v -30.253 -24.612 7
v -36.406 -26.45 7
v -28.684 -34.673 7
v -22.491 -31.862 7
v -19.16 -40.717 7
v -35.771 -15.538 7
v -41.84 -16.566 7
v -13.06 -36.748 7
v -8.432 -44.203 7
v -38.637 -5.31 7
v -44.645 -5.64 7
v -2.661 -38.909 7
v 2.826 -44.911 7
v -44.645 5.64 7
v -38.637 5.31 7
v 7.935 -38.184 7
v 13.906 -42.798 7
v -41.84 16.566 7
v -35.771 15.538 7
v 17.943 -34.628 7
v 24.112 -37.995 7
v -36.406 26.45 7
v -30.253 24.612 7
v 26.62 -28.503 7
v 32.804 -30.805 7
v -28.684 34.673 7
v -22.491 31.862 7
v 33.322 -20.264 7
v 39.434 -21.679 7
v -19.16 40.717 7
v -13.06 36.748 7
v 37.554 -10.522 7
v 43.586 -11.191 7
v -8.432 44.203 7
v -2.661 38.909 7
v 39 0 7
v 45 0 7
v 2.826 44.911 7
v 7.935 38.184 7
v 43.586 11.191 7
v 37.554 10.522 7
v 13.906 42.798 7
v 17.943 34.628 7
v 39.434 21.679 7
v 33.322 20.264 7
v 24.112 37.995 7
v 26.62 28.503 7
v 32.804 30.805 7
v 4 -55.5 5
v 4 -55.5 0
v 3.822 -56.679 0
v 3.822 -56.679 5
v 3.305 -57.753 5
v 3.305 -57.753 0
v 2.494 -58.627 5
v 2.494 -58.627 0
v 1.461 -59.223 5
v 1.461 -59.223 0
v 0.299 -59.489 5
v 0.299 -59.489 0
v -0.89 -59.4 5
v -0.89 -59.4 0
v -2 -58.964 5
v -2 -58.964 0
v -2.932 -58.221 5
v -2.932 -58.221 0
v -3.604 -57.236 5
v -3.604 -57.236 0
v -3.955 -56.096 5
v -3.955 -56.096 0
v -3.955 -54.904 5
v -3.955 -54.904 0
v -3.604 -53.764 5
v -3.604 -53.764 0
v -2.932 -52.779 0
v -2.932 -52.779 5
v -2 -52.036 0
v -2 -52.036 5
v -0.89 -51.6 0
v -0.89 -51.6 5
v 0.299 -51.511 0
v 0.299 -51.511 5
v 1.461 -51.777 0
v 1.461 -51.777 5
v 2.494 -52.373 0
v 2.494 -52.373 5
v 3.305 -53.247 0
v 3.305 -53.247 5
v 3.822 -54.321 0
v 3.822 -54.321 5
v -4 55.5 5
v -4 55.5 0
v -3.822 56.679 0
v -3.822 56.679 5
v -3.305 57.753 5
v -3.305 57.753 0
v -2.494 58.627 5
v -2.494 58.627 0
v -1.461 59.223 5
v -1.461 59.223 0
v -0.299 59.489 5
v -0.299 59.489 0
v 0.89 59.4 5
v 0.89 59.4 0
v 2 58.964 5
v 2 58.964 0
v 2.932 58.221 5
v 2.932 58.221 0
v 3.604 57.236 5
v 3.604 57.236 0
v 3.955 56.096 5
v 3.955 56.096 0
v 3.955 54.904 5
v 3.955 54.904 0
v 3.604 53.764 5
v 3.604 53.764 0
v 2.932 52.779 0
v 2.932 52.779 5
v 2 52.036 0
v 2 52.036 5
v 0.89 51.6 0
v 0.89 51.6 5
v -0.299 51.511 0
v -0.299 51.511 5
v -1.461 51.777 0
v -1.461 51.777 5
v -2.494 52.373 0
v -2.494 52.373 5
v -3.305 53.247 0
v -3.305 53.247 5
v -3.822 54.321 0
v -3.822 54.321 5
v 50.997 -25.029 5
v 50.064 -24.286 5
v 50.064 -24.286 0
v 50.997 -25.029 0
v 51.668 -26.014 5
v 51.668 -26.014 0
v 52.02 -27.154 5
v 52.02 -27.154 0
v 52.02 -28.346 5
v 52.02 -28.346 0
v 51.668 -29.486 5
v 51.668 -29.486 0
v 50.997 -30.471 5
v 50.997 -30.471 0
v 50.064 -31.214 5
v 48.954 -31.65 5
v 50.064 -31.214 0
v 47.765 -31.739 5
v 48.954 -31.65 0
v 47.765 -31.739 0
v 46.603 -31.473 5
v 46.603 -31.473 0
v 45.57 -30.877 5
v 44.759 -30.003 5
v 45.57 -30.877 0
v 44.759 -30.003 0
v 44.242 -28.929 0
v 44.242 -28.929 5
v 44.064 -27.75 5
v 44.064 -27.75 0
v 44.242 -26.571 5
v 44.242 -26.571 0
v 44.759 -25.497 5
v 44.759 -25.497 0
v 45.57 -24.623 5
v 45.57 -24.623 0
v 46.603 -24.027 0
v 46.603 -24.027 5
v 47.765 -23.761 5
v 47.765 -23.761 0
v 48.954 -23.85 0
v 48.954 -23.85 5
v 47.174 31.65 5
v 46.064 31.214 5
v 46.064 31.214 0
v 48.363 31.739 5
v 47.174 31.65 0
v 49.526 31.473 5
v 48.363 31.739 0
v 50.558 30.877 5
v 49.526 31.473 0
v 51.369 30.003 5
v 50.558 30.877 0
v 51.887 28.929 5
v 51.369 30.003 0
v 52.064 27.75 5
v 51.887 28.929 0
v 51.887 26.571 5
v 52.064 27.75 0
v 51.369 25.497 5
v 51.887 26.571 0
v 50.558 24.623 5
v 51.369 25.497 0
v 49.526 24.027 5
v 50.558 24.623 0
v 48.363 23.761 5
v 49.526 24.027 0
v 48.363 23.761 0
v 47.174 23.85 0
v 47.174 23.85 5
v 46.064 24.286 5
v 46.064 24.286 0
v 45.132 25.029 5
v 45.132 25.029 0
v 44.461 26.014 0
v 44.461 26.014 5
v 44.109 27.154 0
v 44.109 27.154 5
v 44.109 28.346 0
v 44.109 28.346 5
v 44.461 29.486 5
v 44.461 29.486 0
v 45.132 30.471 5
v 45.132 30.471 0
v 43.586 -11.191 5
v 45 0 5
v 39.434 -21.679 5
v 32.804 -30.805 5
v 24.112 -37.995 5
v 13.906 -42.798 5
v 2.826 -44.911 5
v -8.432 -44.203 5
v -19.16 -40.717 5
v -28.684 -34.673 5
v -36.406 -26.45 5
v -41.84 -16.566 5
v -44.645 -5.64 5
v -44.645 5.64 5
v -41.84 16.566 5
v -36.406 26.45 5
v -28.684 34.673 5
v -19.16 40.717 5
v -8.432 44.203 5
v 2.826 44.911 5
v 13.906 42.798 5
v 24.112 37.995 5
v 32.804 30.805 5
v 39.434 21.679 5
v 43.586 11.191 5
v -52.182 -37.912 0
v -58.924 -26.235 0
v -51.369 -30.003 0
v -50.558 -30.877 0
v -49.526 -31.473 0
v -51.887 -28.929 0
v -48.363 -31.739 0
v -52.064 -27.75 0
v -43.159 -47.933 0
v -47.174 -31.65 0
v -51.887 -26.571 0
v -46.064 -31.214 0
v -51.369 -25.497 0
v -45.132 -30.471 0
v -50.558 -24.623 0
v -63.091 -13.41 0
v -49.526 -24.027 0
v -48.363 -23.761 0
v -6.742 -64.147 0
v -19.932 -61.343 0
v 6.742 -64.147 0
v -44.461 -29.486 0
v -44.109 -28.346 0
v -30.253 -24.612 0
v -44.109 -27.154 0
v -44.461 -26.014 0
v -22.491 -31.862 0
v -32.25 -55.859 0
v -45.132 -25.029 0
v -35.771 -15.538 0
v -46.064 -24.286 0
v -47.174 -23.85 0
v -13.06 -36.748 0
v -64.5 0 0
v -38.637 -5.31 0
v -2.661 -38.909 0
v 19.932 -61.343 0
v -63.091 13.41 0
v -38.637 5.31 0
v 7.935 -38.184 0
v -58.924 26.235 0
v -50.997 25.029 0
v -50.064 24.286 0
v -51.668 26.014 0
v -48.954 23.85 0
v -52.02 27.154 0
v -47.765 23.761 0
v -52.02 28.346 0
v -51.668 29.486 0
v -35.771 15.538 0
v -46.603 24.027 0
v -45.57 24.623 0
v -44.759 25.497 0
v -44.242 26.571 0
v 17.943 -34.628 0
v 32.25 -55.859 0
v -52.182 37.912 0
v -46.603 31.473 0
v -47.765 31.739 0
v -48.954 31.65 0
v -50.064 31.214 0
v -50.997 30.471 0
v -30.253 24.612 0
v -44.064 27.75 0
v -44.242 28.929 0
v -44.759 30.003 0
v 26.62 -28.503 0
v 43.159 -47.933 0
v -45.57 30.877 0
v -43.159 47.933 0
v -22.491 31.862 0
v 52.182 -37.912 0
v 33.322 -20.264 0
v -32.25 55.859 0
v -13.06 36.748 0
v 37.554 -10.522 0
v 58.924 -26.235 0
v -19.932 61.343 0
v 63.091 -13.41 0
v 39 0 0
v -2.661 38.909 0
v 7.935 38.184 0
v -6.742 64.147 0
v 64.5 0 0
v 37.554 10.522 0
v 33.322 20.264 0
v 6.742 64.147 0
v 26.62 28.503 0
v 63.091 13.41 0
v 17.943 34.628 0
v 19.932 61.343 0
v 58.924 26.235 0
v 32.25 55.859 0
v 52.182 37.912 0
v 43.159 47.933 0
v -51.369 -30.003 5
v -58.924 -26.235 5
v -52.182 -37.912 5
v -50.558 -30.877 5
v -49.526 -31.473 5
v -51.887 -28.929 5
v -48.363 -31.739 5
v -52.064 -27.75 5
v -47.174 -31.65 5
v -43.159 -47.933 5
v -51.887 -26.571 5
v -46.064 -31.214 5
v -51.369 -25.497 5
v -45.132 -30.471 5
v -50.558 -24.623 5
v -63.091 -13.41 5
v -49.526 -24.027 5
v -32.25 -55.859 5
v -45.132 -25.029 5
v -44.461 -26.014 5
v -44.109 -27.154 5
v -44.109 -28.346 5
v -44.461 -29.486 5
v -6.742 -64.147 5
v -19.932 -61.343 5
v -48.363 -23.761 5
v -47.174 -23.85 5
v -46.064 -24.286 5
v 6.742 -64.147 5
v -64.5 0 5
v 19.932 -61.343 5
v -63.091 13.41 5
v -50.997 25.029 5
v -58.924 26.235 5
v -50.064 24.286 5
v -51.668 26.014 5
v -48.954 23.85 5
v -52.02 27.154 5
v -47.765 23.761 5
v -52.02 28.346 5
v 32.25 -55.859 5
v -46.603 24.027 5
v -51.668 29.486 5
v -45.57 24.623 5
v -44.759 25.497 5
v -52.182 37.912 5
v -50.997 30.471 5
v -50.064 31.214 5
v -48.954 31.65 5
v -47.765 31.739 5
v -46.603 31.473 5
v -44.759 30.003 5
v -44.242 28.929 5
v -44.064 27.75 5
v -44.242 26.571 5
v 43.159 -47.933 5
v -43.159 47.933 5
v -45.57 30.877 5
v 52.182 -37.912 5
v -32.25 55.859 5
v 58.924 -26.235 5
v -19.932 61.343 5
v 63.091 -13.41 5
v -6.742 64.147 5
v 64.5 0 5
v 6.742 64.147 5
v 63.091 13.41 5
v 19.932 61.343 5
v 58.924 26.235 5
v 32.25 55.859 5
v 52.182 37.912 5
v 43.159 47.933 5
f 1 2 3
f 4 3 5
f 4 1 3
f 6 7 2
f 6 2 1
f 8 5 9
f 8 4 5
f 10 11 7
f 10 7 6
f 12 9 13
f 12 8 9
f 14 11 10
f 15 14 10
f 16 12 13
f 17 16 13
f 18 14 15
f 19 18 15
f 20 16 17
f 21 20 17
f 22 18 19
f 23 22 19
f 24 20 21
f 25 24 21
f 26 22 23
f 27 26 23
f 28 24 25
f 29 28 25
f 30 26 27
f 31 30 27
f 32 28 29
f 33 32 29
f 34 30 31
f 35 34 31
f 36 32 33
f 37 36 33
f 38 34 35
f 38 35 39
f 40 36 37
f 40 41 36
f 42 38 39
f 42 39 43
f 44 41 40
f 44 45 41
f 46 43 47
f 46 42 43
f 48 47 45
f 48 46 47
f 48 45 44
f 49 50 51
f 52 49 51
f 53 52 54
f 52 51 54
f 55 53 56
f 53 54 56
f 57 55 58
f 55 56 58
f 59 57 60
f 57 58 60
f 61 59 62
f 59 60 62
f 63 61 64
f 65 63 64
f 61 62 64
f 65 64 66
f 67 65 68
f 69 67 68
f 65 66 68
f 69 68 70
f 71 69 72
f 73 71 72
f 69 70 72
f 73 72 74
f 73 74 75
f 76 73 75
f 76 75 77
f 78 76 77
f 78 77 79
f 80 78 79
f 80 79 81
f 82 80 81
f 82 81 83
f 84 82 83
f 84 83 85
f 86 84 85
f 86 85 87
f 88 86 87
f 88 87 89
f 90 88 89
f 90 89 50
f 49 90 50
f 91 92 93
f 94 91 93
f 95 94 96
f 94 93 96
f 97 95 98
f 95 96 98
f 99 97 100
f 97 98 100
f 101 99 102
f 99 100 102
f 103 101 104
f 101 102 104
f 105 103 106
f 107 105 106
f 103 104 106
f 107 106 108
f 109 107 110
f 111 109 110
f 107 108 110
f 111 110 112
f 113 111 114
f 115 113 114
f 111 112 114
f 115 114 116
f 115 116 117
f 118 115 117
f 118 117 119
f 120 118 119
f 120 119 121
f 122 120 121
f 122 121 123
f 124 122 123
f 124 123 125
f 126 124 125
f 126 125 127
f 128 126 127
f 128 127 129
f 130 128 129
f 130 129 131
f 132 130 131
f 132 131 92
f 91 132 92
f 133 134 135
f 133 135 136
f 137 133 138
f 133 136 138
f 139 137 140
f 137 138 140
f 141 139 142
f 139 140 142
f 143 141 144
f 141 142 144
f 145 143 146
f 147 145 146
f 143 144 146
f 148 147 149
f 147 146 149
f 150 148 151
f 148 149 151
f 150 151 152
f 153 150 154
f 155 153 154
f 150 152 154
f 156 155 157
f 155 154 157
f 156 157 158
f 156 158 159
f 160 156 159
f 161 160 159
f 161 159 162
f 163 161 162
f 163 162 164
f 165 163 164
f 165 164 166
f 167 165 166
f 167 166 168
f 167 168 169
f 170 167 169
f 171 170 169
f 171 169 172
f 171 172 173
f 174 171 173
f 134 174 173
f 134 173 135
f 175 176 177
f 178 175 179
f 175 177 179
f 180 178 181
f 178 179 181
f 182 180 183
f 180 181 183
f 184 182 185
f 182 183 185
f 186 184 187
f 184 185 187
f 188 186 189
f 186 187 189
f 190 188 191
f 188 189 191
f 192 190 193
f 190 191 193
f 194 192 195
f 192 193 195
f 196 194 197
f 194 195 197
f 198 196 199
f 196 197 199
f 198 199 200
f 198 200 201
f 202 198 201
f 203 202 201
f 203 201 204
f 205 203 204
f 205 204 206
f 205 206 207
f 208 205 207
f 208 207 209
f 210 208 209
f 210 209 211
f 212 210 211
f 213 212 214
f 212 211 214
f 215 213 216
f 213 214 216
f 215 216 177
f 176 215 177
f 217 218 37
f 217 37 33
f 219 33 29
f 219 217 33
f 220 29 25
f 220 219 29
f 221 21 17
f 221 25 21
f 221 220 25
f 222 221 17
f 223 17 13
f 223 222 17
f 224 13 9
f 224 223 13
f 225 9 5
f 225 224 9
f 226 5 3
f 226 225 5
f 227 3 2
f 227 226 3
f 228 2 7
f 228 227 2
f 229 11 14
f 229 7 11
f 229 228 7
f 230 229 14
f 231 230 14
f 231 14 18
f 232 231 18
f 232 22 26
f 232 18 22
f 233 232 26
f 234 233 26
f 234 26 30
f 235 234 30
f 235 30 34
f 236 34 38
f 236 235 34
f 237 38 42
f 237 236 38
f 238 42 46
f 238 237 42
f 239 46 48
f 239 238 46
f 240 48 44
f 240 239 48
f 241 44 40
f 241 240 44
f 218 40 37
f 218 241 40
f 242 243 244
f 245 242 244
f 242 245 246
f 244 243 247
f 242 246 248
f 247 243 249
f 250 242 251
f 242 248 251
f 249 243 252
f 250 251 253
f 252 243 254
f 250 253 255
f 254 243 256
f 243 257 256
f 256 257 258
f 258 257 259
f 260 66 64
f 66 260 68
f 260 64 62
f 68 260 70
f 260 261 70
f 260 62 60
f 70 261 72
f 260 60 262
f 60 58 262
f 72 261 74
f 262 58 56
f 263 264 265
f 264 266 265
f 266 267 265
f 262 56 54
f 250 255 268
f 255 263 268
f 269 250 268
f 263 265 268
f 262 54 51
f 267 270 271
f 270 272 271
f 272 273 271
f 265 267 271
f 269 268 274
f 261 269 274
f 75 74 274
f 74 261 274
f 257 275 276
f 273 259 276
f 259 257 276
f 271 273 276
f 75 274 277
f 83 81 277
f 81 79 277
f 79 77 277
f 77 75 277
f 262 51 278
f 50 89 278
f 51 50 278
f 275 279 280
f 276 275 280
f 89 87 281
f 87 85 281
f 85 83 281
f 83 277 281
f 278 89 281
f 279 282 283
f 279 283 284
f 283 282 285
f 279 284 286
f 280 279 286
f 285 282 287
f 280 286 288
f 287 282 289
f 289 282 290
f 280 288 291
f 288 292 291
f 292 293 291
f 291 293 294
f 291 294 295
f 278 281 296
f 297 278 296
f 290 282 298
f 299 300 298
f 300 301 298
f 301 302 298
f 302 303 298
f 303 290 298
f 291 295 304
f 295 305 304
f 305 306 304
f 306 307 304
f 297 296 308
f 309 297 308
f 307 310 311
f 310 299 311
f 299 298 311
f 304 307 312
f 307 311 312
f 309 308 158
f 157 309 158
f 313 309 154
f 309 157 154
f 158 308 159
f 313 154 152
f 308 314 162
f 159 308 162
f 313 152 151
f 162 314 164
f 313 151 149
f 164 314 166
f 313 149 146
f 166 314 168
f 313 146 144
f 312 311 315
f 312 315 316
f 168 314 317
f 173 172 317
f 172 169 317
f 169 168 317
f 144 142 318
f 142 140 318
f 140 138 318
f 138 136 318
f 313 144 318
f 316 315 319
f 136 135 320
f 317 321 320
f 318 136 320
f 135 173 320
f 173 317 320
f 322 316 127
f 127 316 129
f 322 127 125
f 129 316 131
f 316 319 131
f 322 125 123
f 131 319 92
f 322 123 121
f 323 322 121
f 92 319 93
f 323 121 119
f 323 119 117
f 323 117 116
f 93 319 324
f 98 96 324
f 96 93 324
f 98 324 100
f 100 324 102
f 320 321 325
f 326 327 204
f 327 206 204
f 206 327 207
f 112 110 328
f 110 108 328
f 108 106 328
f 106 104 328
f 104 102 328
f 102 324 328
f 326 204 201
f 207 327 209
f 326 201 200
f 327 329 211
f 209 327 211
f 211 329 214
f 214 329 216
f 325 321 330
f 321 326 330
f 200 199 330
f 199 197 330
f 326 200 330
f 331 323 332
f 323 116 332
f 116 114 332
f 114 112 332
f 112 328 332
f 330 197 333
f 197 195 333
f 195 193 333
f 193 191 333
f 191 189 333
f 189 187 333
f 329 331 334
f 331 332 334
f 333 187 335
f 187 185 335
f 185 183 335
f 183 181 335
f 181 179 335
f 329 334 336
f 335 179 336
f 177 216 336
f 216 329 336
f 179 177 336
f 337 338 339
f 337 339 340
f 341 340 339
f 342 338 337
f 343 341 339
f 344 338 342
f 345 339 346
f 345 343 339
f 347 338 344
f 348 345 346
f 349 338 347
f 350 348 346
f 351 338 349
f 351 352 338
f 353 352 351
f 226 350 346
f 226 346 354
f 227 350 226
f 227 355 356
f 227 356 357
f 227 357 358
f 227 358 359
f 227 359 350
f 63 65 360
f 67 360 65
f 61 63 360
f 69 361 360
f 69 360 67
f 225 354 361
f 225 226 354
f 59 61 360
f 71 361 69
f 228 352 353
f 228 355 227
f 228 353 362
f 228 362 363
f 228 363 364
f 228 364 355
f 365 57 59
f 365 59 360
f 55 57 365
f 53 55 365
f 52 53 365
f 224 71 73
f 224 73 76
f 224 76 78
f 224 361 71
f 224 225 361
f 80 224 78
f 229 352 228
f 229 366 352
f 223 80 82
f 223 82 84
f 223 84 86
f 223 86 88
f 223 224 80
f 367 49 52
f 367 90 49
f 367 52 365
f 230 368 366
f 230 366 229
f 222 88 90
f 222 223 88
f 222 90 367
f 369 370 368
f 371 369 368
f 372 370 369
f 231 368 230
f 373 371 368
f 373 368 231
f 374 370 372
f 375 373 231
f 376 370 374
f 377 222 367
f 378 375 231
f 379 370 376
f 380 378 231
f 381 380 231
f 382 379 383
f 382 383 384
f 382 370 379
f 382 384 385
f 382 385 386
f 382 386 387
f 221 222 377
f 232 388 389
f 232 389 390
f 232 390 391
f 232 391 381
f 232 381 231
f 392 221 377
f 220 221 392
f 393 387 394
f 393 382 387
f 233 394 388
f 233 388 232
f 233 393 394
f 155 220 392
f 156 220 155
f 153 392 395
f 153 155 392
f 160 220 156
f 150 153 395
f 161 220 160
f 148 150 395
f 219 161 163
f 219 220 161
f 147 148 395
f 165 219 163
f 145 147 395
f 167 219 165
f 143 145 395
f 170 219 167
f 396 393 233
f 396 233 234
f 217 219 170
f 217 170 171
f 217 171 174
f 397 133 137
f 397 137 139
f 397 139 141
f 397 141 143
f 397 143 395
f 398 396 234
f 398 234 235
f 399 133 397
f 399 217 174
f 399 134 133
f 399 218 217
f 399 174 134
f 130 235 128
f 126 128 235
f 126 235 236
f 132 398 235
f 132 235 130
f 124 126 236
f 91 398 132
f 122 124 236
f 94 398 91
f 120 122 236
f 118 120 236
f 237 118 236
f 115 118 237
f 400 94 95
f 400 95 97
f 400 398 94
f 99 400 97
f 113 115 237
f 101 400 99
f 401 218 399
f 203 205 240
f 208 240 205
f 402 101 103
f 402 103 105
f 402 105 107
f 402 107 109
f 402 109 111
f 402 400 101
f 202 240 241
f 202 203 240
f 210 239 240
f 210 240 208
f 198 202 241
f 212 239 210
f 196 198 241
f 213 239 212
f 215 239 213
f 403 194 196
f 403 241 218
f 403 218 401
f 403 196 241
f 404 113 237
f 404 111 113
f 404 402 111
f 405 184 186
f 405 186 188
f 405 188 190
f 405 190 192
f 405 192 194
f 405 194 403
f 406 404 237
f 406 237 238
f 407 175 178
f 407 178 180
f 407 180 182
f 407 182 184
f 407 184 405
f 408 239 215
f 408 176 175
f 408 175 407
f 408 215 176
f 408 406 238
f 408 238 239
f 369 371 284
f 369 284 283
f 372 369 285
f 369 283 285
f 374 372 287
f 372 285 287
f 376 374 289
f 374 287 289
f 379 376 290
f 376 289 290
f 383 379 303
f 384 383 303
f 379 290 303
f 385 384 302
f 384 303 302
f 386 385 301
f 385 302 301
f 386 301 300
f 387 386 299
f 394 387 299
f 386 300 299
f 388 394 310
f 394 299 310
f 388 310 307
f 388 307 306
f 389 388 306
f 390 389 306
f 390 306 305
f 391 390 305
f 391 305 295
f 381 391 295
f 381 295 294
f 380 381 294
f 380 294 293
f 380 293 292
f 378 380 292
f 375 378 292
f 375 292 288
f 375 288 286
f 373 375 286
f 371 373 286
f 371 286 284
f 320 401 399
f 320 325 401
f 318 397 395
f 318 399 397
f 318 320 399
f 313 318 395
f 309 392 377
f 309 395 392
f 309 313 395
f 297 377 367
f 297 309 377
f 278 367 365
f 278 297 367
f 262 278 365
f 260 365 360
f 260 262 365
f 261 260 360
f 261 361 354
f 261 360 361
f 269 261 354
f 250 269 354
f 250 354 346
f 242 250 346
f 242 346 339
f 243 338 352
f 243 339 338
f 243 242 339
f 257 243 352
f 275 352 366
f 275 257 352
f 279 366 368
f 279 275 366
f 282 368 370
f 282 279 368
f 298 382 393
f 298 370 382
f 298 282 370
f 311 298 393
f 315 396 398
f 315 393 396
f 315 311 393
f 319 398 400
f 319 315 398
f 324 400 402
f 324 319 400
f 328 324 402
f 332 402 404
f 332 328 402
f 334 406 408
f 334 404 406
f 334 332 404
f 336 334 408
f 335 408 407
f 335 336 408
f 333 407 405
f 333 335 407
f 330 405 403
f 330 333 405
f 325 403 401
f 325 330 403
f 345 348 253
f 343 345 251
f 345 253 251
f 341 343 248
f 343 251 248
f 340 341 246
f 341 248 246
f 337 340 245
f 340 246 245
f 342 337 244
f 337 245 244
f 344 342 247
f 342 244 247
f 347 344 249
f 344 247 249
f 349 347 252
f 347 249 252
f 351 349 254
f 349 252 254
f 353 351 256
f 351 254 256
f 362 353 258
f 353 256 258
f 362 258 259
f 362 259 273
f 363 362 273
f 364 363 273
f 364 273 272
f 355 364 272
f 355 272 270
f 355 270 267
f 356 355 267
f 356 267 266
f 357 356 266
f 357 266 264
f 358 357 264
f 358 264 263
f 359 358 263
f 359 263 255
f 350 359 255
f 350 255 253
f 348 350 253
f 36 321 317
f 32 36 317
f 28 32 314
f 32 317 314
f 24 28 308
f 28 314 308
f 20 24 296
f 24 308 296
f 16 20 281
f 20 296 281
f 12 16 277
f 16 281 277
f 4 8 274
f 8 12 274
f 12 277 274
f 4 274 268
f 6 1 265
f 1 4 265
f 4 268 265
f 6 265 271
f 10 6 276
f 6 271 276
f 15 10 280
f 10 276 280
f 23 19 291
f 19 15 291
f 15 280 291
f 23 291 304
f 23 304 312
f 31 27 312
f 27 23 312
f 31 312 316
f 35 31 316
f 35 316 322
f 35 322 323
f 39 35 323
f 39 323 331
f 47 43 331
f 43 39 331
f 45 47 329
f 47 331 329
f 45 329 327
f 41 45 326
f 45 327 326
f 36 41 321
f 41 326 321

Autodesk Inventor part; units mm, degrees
ref_plane "YZ Plane" through (0, 0, 0) normal (1, 0, 0) x (0, 1, 0)
ref_plane "XZ Plane" through (0, 0, 0) normal (0, 1, 0) x (-1, 0, 0)
ref_plane "XY Plane" through (0, 0, 0) normal (0, 0, 1) x (1, 0, 0)
sketch "Sketch1" plane through (0, 0, 0) normal (0, 0, 1) x (1, 0, 0)
  circle A0 centre (0, 0) radius 39
  circle A1 centre (0, 0) radius 42 construction
  circle A2 centre (0, 42) radius 3 construction
  circle A3 centre (0, 0) radius 37
  circle A4 centre (0, 0) radius 45
  circle A5 centre (0, 0) radius 64.5
  dimension "d5" = 84
  dimension "d0" = 78
  dimension "d6" = 6
  dimension "d14" = 74
  dimension "d15" = 90
  dimension "d16" = 129
extrude "Extrusion2" add sketch "Sketch1" along normal blind 5 contours A5
extrude "Extrusion3" add sketch "Sketch1" along normal blind 7 contours A4
sketch "Sketch2" plane through (0, 0, 0) normal (0, 0, -1) x (-1, 0, 0)
  circle A0 centre (0, 0) radius 55.5
  circle A1 centre (0, 55.5) radius 4
  dimension "d21" = 111
  dimension "d22" = 8
extrude "Extrusion4" cut sketch "Sketch2" against normal through all contours A1 A0 | A0 A1 picked at (-0.157, 54.1653) picked at (0.1387, 56.8154)
pattern_circular "Circular Pattern1" count 6 over 360 about axis through (0, 0, -10) along (0, 0, 1) of "Extrusion4"
thread "Thread1" size "M8x1.25" class "6H" standard "ANSI Metric M Profile" full length
thread "Thread2" size "M8x1.25" class "6H" standard "ANSI Metric M Profile" full length
thread "Thread3" size "M8x1.25" class "6H" standard "ANSI Metric M Profile" full length
thread "Thread4" size "M8x1.25" class "6H" standard "ANSI Metric M Profile" full length
thread "Thread5" size "M8x1.25" class "6H" standard "ANSI Metric M Profile" full length
thread "Thread6" size "M8x1.25" class "6H" standard "ANSI Metric M Profile" full length
properties part number "back" material "Aluminum 6061"
